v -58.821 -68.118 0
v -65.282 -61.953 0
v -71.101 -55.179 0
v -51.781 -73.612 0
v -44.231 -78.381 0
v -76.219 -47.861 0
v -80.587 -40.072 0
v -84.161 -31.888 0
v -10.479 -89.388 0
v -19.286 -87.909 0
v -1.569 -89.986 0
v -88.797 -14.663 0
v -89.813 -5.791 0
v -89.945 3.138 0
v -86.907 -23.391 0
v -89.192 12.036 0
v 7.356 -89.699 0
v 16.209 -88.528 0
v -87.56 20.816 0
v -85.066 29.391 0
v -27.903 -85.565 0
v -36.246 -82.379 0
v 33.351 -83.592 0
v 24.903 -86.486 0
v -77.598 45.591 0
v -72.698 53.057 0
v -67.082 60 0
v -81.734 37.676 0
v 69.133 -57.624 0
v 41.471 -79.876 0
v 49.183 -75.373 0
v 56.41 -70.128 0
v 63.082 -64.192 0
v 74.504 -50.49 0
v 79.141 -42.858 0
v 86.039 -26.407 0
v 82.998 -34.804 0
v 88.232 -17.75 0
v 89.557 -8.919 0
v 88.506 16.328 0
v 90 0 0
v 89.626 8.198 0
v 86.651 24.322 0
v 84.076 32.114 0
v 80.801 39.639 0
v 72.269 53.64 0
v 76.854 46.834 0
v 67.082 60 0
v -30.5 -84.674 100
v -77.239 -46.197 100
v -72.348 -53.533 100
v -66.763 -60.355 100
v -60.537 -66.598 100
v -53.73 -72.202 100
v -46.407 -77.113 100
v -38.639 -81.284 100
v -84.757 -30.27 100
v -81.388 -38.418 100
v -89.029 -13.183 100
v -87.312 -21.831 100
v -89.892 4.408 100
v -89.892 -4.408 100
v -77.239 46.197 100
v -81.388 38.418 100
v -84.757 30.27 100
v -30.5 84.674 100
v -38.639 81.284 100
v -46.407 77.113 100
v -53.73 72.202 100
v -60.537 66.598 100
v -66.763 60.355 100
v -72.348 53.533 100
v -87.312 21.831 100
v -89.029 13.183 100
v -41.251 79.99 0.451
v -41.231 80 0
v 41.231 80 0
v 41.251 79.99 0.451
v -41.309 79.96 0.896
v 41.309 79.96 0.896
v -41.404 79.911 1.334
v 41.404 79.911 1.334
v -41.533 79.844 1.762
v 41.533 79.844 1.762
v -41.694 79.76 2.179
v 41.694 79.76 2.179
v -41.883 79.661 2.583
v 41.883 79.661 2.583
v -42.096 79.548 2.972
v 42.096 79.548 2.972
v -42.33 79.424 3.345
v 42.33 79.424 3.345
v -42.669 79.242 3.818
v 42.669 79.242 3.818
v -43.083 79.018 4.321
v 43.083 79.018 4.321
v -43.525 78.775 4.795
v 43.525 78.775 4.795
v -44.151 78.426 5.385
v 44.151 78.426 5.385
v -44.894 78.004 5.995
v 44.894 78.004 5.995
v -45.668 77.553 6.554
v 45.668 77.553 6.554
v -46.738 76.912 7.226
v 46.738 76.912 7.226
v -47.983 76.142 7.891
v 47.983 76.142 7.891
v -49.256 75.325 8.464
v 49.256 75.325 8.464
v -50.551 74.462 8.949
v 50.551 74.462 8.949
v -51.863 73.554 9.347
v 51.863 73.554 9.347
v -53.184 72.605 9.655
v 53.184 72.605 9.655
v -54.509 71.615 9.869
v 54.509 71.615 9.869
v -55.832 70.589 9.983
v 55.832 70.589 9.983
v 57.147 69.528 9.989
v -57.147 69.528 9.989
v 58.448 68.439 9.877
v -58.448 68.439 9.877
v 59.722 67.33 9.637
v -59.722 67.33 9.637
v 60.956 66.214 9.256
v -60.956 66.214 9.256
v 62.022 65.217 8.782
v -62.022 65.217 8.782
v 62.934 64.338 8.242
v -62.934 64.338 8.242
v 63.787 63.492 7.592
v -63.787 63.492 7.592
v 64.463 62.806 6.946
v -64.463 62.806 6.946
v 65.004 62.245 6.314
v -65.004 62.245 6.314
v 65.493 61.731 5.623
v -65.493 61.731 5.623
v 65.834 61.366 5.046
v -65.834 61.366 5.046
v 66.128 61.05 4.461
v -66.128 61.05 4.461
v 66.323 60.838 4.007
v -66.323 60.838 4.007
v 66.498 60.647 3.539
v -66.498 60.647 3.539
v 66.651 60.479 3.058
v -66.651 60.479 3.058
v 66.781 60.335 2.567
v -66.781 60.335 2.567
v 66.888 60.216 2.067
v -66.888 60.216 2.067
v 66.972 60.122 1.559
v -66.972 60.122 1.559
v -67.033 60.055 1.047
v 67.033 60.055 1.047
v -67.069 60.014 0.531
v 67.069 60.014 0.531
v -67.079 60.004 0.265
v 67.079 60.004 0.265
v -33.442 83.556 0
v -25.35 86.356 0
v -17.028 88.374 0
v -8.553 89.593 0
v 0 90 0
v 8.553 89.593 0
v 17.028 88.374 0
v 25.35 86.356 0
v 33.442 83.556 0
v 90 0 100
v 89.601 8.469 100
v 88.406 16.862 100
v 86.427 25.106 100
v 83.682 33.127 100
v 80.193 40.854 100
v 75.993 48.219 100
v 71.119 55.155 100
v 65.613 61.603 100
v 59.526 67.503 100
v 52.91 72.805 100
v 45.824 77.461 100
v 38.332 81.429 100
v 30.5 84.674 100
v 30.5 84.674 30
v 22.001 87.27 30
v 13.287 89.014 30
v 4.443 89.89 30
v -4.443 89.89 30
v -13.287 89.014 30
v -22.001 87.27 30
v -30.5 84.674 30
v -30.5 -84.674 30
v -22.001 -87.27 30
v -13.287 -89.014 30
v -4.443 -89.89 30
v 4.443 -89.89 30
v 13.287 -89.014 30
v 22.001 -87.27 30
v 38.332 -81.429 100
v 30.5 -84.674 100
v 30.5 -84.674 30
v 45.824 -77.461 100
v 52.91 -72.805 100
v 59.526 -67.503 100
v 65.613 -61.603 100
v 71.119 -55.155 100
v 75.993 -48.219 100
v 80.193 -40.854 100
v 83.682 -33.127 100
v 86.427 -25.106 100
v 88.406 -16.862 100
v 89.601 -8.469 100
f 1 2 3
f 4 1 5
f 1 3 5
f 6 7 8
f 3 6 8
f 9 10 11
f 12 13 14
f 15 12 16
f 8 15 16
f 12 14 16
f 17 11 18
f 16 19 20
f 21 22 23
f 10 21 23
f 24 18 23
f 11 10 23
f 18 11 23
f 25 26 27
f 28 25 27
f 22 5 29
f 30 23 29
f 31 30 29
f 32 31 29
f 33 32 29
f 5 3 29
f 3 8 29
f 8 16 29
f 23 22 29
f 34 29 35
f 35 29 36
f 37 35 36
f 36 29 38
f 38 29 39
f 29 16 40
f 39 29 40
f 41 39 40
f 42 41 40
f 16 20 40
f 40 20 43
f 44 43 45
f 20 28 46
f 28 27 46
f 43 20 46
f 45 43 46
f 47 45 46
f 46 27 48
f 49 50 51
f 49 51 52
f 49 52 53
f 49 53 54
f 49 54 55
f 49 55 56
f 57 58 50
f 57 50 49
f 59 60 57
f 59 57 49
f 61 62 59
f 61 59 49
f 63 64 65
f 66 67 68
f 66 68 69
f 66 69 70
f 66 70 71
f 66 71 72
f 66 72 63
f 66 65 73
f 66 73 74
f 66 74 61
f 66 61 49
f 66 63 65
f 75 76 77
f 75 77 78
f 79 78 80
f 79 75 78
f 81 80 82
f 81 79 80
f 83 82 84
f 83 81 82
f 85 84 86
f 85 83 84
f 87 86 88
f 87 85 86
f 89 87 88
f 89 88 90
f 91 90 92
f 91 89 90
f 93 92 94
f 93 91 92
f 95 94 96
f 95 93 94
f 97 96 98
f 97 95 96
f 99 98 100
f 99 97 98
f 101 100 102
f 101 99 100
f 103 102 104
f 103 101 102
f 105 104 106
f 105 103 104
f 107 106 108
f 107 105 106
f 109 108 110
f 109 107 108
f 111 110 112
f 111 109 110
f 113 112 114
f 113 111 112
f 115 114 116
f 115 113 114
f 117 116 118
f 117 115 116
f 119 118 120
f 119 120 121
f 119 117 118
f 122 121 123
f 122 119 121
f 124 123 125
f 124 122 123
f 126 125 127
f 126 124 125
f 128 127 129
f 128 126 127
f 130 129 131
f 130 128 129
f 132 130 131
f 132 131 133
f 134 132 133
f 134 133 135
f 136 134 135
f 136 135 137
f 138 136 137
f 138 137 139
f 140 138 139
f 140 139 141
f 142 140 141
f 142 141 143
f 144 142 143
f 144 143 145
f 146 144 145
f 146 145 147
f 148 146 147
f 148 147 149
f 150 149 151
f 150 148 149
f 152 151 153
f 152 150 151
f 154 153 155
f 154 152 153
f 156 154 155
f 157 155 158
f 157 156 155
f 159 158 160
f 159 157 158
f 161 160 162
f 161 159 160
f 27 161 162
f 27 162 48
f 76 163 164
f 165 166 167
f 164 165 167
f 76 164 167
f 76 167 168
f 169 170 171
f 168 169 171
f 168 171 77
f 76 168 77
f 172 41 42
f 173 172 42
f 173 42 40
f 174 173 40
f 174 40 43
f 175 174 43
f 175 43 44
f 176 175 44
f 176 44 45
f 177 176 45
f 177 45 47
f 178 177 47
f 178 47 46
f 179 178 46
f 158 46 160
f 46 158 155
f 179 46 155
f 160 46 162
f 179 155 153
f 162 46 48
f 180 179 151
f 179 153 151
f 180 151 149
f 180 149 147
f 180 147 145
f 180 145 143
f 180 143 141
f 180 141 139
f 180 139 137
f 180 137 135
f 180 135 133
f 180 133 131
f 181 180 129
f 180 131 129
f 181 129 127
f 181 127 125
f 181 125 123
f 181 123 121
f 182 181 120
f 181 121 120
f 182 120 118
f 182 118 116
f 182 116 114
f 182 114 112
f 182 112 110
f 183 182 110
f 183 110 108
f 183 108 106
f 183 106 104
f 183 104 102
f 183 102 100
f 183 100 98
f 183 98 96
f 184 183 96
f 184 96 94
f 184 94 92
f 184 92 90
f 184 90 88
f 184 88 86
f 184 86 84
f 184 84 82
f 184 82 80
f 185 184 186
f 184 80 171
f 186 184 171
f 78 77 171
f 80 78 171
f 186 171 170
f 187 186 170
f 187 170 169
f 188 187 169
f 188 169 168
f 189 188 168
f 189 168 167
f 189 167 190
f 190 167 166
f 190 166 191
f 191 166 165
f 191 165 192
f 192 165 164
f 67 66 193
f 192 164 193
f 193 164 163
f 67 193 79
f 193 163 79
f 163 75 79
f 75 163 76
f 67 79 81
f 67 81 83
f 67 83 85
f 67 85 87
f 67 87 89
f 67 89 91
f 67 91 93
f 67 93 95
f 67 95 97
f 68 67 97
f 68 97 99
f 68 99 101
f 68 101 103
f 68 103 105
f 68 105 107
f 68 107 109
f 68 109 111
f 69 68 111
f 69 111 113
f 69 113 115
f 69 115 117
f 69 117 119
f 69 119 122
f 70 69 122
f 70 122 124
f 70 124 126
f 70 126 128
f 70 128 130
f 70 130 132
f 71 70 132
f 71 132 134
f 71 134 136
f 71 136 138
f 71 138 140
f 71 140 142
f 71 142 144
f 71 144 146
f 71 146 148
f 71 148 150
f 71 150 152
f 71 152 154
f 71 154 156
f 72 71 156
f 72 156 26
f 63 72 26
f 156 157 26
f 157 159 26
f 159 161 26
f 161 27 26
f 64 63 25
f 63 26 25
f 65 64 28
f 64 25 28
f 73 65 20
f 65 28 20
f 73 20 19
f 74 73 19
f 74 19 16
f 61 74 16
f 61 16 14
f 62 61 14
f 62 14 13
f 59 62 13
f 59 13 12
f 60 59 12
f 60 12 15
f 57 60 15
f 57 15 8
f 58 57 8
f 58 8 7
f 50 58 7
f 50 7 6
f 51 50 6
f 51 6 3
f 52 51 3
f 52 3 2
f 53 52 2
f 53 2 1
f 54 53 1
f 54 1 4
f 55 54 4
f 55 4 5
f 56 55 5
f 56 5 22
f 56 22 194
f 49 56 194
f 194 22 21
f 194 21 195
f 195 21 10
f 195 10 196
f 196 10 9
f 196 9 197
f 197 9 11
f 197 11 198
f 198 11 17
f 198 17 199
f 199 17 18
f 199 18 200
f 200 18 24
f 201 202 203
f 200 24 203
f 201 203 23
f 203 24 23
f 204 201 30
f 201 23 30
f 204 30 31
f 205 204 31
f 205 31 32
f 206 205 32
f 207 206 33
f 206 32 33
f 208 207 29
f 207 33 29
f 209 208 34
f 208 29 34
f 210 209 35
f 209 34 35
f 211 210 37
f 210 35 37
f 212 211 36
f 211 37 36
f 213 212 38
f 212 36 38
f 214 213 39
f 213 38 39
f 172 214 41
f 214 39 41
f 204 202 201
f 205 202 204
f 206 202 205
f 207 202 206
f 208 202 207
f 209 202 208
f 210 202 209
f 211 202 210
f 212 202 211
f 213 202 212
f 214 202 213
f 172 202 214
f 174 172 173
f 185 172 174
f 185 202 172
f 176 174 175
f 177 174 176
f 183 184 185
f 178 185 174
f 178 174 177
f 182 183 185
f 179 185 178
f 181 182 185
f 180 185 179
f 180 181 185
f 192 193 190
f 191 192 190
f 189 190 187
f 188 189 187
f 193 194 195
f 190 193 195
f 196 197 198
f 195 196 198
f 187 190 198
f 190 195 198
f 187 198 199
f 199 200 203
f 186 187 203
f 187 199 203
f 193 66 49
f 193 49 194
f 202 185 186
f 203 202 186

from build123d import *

# Parameters (mm, degrees)
SKETCH1_R               = 90
BOSS_EXTRUDE1_DEPTH     = 100
CUT_EXTRUDE1_DEPTH      = 200
CUT_EXTRUDE1_DEPTH_BACK = 200
SKETCH2_W               = 61
SKETCH2_H               = 70
CUT_EXTRUDE2_DEPTH      = 200
CUT_EXTRUDE2_DEPTH_BACK = 200
SKETCH3_R               = 10


with BuildPart() as part:
    # Sketch1 → Boss-Extrude1 (new body)
    with BuildSketch(Plane.XY):
        Circle(SKETCH1_R)
    extrude(amount=BOSS_EXTRUDE1_DEPTH)

    # Sketch2 → Cut-Extrude1 (cut, two sides: drawn at the far end of the back side and taken through both)
    with BuildSketch(Plane(origin=(0, 0, 0), x_dir=(1, 0, 0), z_dir=(0, 1, 0)).offset(-CUT_EXTRUDE1_DEPTH_BACK)):
        with Locations((0, -65)):
            Rectangle(SKETCH2_W, SKETCH2_H)
    extrude(amount=CUT_EXTRUDE1_DEPTH + CUT_EXTRUDE1_DEPTH_BACK, mode=Mode.SUBTRACT)

    # Sketch3 → Cut-Extrude2 (cut, two sides: drawn at the far end of the back side and taken through both)
    with BuildSketch(Plane(origin=(0, 0, 0), x_dir=(0, 0, -1), z_dir=(1, 0, 0)).offset(-CUT_EXTRUDE2_DEPTH_BACK)):
        with Locations((0, 70)):
            Circle(SKETCH3_R)
    extrude(amount=CUT_EXTRUDE2_DEPTH + CUT_EXTRUDE2_DEPTH_BACK, mode=Mode.SUBTRACT)


solid = part.part
